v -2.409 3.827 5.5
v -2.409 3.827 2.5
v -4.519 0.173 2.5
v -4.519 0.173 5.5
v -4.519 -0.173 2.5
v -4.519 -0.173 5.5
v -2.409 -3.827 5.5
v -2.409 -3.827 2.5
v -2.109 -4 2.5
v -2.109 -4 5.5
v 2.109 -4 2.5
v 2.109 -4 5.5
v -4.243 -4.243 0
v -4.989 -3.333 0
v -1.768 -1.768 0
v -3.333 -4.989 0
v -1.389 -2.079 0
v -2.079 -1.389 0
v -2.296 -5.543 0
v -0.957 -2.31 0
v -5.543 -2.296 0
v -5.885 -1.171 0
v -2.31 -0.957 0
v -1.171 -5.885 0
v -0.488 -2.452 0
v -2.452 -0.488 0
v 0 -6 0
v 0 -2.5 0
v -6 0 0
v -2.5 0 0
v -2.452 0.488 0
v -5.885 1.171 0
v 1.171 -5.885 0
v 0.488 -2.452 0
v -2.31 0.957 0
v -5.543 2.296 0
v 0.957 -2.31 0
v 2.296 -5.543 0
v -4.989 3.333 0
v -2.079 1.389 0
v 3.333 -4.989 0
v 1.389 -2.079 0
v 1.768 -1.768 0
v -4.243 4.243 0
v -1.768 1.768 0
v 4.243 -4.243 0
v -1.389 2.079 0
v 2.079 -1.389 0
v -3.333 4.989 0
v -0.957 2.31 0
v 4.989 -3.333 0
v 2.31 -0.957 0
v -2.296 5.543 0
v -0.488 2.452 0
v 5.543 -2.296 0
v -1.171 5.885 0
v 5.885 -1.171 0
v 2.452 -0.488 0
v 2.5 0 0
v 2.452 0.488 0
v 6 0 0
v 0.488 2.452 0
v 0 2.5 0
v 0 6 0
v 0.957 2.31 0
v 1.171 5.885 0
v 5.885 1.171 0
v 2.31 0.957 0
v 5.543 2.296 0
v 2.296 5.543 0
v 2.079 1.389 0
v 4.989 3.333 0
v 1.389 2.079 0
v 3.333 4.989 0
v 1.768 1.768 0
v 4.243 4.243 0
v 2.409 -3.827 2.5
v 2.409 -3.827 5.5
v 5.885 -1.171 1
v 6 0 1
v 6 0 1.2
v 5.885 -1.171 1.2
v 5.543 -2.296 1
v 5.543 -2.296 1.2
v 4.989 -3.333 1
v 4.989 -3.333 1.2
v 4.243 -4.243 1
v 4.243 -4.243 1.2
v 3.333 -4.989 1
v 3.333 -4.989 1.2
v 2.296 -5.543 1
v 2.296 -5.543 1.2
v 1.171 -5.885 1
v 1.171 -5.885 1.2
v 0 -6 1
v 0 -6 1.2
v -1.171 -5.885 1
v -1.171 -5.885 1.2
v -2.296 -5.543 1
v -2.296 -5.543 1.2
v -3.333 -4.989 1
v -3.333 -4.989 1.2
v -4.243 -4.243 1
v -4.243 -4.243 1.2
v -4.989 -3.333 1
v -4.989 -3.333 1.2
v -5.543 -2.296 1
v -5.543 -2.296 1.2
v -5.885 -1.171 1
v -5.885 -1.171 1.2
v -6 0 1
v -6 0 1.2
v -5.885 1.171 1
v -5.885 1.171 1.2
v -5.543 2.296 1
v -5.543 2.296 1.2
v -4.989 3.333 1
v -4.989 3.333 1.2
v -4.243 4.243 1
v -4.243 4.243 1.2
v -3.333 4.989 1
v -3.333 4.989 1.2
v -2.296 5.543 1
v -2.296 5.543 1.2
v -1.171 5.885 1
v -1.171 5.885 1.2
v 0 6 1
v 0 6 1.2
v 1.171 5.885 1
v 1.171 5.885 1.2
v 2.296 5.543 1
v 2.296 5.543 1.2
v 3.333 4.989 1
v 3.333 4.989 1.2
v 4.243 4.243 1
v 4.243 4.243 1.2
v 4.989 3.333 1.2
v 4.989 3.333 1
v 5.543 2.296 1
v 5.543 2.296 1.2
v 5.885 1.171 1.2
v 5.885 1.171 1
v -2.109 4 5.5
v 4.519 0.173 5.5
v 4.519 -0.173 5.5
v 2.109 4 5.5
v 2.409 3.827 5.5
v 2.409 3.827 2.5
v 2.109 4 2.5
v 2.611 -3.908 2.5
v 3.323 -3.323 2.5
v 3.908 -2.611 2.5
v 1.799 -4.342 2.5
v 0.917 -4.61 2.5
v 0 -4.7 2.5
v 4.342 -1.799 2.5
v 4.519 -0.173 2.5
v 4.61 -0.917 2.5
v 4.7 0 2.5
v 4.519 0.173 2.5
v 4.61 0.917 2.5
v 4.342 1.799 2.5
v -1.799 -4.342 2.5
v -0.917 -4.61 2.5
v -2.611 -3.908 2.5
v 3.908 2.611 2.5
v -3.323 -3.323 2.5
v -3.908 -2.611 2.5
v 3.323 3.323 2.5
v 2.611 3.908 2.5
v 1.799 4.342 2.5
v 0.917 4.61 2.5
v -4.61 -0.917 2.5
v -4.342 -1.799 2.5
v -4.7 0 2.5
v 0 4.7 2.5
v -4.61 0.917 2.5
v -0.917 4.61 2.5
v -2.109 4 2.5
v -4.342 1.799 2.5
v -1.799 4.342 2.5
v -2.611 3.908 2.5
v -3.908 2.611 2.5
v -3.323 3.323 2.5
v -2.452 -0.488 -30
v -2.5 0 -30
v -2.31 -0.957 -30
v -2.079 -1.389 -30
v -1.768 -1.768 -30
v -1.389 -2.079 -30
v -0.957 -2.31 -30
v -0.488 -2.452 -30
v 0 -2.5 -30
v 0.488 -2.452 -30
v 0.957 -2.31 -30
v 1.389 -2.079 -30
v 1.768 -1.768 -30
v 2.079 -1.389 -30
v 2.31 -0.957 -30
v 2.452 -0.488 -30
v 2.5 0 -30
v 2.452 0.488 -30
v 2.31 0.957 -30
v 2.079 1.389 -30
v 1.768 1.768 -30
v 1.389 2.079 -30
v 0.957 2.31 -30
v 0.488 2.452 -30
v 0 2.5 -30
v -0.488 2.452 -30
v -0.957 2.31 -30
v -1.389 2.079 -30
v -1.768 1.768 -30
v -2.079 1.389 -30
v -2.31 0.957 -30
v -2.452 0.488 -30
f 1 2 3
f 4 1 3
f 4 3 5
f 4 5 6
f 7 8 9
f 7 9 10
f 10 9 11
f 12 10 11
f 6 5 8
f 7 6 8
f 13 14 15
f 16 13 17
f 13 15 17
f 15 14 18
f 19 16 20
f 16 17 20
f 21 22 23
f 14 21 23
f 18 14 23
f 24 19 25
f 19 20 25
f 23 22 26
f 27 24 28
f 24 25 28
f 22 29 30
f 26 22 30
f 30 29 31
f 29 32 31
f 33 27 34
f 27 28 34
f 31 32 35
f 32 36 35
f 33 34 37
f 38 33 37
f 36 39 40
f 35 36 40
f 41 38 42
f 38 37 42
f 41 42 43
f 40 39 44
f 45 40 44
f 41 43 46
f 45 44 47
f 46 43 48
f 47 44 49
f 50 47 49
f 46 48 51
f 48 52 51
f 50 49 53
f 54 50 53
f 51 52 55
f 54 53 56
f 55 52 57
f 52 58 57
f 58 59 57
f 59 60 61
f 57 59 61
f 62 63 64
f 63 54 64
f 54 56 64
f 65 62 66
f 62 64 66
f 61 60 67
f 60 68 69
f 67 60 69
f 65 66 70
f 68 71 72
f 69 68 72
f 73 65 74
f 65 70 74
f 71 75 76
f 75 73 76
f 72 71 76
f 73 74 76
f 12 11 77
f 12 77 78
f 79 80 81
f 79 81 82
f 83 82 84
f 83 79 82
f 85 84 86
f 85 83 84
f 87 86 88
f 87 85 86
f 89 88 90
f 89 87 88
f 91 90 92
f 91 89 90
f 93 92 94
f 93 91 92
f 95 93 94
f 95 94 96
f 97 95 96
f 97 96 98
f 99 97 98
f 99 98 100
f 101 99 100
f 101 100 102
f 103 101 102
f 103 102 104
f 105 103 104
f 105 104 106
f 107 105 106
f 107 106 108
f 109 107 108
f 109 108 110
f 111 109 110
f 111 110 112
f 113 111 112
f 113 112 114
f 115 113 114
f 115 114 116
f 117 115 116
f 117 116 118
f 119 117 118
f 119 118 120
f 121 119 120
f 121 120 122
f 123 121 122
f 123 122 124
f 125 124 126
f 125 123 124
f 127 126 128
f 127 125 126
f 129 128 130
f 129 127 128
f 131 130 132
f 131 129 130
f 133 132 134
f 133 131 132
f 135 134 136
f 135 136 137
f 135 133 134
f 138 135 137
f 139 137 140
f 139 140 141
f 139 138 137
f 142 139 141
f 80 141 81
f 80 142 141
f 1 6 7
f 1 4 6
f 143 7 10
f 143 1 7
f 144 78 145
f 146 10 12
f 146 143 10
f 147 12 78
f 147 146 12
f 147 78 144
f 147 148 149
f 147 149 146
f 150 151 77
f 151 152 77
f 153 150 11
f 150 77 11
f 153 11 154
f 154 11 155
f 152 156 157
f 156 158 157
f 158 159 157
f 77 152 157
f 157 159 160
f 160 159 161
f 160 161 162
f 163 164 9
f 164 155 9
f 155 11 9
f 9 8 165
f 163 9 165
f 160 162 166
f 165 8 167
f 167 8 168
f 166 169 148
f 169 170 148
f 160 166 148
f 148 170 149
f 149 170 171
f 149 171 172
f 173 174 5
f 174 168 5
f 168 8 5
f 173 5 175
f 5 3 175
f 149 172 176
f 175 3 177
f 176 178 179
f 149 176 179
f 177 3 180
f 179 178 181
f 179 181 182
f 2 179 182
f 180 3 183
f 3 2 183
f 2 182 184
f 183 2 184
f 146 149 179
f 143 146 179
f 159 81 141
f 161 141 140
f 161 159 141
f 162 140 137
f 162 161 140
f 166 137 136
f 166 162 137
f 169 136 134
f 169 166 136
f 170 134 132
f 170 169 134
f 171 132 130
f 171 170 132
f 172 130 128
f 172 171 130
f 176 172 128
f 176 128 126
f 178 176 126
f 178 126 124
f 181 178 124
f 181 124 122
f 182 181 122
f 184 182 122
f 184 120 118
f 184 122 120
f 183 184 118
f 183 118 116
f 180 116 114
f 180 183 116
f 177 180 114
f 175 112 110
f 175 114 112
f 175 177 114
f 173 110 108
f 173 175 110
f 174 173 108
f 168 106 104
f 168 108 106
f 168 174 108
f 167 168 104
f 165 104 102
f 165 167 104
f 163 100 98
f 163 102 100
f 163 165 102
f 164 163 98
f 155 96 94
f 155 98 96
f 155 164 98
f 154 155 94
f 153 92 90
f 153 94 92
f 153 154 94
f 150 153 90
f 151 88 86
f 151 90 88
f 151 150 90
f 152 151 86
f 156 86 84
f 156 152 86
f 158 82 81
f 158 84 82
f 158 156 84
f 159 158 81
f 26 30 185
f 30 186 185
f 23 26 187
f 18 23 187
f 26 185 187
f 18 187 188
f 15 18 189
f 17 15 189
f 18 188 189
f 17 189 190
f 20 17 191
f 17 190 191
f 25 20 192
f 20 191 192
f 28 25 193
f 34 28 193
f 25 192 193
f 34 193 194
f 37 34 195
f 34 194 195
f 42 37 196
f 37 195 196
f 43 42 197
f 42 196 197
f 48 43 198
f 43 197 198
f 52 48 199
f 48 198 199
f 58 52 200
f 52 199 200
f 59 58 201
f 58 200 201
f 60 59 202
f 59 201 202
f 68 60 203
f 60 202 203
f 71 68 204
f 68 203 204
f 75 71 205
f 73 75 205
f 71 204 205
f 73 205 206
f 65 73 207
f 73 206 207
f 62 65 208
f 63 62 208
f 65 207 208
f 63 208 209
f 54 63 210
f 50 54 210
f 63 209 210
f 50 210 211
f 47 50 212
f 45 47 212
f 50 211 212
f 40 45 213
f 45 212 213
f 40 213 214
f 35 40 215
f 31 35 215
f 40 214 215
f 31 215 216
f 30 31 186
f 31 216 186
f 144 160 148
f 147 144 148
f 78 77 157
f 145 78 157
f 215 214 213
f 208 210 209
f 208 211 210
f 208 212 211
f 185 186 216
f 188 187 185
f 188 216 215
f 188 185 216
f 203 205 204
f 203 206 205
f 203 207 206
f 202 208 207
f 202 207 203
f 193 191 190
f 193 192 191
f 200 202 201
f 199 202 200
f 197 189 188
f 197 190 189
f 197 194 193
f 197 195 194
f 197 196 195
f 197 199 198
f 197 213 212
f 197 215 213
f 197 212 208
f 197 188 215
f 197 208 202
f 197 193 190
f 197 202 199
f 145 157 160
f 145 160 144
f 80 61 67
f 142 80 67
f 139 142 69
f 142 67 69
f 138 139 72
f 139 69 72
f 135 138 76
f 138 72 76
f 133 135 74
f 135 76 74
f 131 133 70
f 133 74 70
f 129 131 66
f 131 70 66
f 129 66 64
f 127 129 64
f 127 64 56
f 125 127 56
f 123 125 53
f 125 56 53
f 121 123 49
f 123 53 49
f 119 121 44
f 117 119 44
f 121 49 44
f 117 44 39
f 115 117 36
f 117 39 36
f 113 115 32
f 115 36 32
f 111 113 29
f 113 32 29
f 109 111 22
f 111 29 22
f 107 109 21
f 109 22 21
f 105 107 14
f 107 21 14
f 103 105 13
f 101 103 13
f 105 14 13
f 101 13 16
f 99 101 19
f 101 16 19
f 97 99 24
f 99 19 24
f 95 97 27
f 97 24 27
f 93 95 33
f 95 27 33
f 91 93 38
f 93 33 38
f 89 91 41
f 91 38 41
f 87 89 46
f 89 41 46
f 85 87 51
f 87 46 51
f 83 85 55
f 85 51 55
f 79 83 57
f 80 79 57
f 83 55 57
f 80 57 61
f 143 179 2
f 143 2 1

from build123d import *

# Parameters (mm, degrees)
SKETCH1_W                = 2.5
SKETCH1_H                = 30
SKETCH2_R                = 6
BOSS_EXTRUDE1_DEPTH      = 1
SKETCH3_R                = 4.4
BOSS_EXTRUDE2_DEPTH      = 1.5
CHAMFER1_SIZE            = 1.8
BOSS_EXTRUDE3_DEPTH      = 3
BOSS_EXTRUDE3_DEPTH_BACK = 1.5
CHAMFER2_SIZE            = 0.2
CHAMFER2_EDGE_2_SIZE     = 0.2
CHAMFER2_EDGE_3_SIZE     = 0.2
CHAMFER2_EDGE_4_SIZE     = 0.2
CHAMFER2_EDGE_5_SIZE     = 0.2
CHAMFER2_EDGE_6_SIZE     = 0.2


with BuildPart() as part:
    # Sketch1 → Revolve1 (revolve)
    with BuildSketch(Plane(origin=(0, 0, 0), x_dir=(1, 0, 0), z_dir=(0, 1, 0)), mode=Mode.PRIVATE) as revolve1_sk:
        with Locations((1.25, 15)):
            Rectangle(SKETCH1_W, SKETCH1_H)
    revolve(revolve1_sk.sketch.rotate(Axis((0, 0, -30), (0, 0, 1)), 180), axis=Axis((0, 0, -30), (0, 0, 1)))

    # Sketch2 → Boss-Extrude1 (add)
    with BuildSketch(Plane.XY):
        Circle(SKETCH2_R)
    extrude(amount=BOSS_EXTRUDE1_DEPTH)

    # Sketch3 → Boss-Extrude2 (add)
    with BuildSketch(Plane.XY.offset(1)):
        Circle(SKETCH3_R)
    extrude(amount=BOSS_EXTRUDE2_DEPTH)

    # Chamfer1
    # the kernel refuses this chamfer: 1.8 mm, written as the material it adds along each edge
    with BuildSketch(Plane(origin=(0, 0, 1), x_dir=(1, 0, 0), z_dir=(0, -1, 0))) as chamfer1_piece_1_section:
        Polygon((4.4 + CHAMFER1_SIZE, 0), (4.4, CHAMFER1_SIZE), (4.4, 0), align=None)
    chamfer1_piece_1 = revolve(axis=Axis((0, 0, 1), (0, 0, 1)), mode=Mode.PRIVATE)
    chamfer1_piece_1 = chamfer1_piece_1 & Plane(origin=(0, 0, 1.82351745), x_dir=(1, 0, 0), z_dir=(0, 0, -1)) * Cylinder(6, 25, mode=Mode.PRIVATE)
    chamfer1_piece_1 = split(chamfer1_piece_1, bisect_by=Plane(origin=(-5.32351745, 0, 2.5), z_dir=(0, 0, -1)), keep=Keep.TOP, mode=Mode.PRIVATE)
    add(chamfer1_piece_1)

    # Sketch4 → Boss-Extrude3 (add, two sides: drawn at the far end of the back side and taken through both)
    with BuildSketch(Plane.XY.offset(2.5).offset(-BOSS_EXTRUDE3_DEPTH_BACK)):
        Polygon((-2.309401077, 4), (-4.618802154, 0), (-2.309401077, -4), (2.309401077, -4), (4.618802154, 0), (2.309401077, 4), align=None)
    extrude(amount=BOSS_EXTRUDE3_DEPTH + BOSS_EXTRUDE3_DEPTH_BACK)

    # Chamfer2
    chamfer2_edges = [part.edges().sort_by_distance(p)[0] for p in [
        (-2.309401077, 4, 4),
    ]]
    chamfer(chamfer2_edges, length=CHAMFER2_SIZE)

    # Chamfer2 edge 2
    chamfer2_edge_2_edges = [part.edges().sort_by_distance(p)[0] for p in [
        (2.309401077, 4, 4),
    ]]
    chamfer(chamfer2_edge_2_edges, length=CHAMFER2_EDGE_2_SIZE)

    # Chamfer2 edge 3
    chamfer2_edge_3_edges = [part.edges().sort_by_distance(p)[0] for p in [
        (4.618802154, 0, 4),
    ]]
    chamfer(chamfer2_edge_3_edges, length=CHAMFER2_EDGE_3_SIZE)

    # Chamfer2 edge 4
    chamfer2_edge_4_edges = [part.edges().sort_by_distance(p)[0] for p in [
        (2.309401077, -4, 4),
    ]]
    chamfer(chamfer2_edge_4_edges, length=CHAMFER2_EDGE_4_SIZE)

    # Chamfer2 edge 5
    chamfer2_edge_5_edges = [part.edges().sort_by_distance(p)[0] for p in [
        (-2.309401077, -4, 4),
    ]]
    chamfer(chamfer2_edge_5_edges, length=CHAMFER2_EDGE_5_SIZE)

    # Chamfer2 edge 6
    chamfer2_edge_6_edges = [part.edges().sort_by_distance(p)[0] for p in [
        (-4.618802154, 0, 4),
    ]]
    chamfer(chamfer2_edge_6_edges, length=CHAMFER2_EDGE_6_SIZE)


solid = part.part
